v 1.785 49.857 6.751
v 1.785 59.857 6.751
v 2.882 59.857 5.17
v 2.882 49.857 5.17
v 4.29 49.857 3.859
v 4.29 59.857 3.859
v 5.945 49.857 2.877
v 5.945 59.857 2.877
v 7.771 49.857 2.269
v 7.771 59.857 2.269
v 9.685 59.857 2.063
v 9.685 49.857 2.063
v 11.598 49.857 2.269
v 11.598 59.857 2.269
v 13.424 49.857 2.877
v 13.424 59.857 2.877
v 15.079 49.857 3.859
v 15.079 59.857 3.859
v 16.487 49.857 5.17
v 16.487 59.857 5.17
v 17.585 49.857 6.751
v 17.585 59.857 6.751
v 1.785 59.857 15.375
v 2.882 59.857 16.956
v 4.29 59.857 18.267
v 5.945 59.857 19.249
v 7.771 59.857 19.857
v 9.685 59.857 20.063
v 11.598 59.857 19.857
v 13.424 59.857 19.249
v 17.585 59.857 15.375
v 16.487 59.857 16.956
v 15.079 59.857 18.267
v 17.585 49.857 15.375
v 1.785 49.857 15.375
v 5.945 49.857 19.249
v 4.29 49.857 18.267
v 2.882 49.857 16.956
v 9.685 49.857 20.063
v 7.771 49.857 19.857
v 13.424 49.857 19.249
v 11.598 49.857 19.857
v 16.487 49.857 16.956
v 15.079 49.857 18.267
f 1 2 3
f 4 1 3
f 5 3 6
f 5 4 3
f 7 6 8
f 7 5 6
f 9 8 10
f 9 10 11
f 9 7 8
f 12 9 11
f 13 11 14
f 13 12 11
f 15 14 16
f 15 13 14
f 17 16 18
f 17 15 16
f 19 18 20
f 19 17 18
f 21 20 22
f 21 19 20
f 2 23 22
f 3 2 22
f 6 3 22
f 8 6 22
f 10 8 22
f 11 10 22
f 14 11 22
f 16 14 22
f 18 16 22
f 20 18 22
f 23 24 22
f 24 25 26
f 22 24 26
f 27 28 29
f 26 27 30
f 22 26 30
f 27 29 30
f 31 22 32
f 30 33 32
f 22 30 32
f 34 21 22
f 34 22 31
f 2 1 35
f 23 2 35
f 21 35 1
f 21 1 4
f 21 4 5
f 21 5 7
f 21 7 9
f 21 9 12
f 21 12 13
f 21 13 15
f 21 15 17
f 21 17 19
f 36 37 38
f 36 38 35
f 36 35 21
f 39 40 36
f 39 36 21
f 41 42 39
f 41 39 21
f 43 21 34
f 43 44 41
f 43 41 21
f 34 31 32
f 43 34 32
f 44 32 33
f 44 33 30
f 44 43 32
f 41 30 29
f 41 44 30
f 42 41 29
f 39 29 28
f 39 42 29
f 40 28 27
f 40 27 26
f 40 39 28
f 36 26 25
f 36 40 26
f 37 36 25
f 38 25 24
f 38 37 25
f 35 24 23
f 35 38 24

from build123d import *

# Parameters (mm, degrees)
CIRCLE003_AS_DRAWN_R                    = 9
EXTRUDE012_DEPTH                        = 10
EXTRUDE012_ONTO_CIRCLE003_ROLL_ANGLE    = 90
RECTANGLE006_AS_DRAWN_W                 = 15.8
RECTANGLE006_AS_DRAWN_H                 = 20.5
EXTRUDE011_DEPTH                        = 10
EXTRUDE011_ONTO_RECTANGLE006_ROLL_ANGLE = 90


with BuildPart() as extrude012:
    # Circle003 as drawn → Extrude012 (new)
    with BuildSketch(Plane.XY):
        Circle(CIRCLE003_AS_DRAWN_R)
    extrude(amount=-EXTRUDE012_DEPTH)


with BuildPart() as extrude012_1:
    # Extrude012 onto Circle003 roll: moved
    add(extrude012.part.rotate(Axis((0, 0, 0), (1, 0, 0)), EXTRUDE012_ONTO_CIRCLE003_ROLL_ANGLE))


with BuildPart() as extrude012_2:
    # Extrude012 onto Circle003 placement: moved
    add(extrude012_1.part.moved(Location((-26.421617, -16.969141, -4.904319))))


with BuildPart() as corpomotor:
    # Rectangle006 as drawn → Extrude011 (new)
    with BuildSketch(Plane.XY):
        with Locations((7.9, 10.25)):
            Rectangle(RECTANGLE006_AS_DRAWN_W, RECTANGLE006_AS_DRAWN_H)
    extrude(amount=-EXTRUDE011_DEPTH)


with BuildPart() as corpomotor_1:
    # Extrude011 onto Rectangle006 roll: moved
    add(corpomotor.part.rotate(Axis((0, 0, 0), (1, 0, 0)), EXTRUDE011_ONTO_RECTANGLE006_ROLL_ANGLE))


with BuildPart() as corpomotor_2:
    # Extrude011 onto Rectangle006 placement: moved
    add(corpomotor_1.part.moved(Location((-34.321617, -16.969141, -15.154319))))

    # Common002: intersect Extrude012
    add(extrude012_2.part, mode=Mode.INTERSECT)


with BuildPart() as corpomotor_3:
    # Common002 placement: moved
    add(corpomotor_2.part.moved(Location((36.106213, 66.825929, 15.967406))))


solid = corpomotor_3.part
